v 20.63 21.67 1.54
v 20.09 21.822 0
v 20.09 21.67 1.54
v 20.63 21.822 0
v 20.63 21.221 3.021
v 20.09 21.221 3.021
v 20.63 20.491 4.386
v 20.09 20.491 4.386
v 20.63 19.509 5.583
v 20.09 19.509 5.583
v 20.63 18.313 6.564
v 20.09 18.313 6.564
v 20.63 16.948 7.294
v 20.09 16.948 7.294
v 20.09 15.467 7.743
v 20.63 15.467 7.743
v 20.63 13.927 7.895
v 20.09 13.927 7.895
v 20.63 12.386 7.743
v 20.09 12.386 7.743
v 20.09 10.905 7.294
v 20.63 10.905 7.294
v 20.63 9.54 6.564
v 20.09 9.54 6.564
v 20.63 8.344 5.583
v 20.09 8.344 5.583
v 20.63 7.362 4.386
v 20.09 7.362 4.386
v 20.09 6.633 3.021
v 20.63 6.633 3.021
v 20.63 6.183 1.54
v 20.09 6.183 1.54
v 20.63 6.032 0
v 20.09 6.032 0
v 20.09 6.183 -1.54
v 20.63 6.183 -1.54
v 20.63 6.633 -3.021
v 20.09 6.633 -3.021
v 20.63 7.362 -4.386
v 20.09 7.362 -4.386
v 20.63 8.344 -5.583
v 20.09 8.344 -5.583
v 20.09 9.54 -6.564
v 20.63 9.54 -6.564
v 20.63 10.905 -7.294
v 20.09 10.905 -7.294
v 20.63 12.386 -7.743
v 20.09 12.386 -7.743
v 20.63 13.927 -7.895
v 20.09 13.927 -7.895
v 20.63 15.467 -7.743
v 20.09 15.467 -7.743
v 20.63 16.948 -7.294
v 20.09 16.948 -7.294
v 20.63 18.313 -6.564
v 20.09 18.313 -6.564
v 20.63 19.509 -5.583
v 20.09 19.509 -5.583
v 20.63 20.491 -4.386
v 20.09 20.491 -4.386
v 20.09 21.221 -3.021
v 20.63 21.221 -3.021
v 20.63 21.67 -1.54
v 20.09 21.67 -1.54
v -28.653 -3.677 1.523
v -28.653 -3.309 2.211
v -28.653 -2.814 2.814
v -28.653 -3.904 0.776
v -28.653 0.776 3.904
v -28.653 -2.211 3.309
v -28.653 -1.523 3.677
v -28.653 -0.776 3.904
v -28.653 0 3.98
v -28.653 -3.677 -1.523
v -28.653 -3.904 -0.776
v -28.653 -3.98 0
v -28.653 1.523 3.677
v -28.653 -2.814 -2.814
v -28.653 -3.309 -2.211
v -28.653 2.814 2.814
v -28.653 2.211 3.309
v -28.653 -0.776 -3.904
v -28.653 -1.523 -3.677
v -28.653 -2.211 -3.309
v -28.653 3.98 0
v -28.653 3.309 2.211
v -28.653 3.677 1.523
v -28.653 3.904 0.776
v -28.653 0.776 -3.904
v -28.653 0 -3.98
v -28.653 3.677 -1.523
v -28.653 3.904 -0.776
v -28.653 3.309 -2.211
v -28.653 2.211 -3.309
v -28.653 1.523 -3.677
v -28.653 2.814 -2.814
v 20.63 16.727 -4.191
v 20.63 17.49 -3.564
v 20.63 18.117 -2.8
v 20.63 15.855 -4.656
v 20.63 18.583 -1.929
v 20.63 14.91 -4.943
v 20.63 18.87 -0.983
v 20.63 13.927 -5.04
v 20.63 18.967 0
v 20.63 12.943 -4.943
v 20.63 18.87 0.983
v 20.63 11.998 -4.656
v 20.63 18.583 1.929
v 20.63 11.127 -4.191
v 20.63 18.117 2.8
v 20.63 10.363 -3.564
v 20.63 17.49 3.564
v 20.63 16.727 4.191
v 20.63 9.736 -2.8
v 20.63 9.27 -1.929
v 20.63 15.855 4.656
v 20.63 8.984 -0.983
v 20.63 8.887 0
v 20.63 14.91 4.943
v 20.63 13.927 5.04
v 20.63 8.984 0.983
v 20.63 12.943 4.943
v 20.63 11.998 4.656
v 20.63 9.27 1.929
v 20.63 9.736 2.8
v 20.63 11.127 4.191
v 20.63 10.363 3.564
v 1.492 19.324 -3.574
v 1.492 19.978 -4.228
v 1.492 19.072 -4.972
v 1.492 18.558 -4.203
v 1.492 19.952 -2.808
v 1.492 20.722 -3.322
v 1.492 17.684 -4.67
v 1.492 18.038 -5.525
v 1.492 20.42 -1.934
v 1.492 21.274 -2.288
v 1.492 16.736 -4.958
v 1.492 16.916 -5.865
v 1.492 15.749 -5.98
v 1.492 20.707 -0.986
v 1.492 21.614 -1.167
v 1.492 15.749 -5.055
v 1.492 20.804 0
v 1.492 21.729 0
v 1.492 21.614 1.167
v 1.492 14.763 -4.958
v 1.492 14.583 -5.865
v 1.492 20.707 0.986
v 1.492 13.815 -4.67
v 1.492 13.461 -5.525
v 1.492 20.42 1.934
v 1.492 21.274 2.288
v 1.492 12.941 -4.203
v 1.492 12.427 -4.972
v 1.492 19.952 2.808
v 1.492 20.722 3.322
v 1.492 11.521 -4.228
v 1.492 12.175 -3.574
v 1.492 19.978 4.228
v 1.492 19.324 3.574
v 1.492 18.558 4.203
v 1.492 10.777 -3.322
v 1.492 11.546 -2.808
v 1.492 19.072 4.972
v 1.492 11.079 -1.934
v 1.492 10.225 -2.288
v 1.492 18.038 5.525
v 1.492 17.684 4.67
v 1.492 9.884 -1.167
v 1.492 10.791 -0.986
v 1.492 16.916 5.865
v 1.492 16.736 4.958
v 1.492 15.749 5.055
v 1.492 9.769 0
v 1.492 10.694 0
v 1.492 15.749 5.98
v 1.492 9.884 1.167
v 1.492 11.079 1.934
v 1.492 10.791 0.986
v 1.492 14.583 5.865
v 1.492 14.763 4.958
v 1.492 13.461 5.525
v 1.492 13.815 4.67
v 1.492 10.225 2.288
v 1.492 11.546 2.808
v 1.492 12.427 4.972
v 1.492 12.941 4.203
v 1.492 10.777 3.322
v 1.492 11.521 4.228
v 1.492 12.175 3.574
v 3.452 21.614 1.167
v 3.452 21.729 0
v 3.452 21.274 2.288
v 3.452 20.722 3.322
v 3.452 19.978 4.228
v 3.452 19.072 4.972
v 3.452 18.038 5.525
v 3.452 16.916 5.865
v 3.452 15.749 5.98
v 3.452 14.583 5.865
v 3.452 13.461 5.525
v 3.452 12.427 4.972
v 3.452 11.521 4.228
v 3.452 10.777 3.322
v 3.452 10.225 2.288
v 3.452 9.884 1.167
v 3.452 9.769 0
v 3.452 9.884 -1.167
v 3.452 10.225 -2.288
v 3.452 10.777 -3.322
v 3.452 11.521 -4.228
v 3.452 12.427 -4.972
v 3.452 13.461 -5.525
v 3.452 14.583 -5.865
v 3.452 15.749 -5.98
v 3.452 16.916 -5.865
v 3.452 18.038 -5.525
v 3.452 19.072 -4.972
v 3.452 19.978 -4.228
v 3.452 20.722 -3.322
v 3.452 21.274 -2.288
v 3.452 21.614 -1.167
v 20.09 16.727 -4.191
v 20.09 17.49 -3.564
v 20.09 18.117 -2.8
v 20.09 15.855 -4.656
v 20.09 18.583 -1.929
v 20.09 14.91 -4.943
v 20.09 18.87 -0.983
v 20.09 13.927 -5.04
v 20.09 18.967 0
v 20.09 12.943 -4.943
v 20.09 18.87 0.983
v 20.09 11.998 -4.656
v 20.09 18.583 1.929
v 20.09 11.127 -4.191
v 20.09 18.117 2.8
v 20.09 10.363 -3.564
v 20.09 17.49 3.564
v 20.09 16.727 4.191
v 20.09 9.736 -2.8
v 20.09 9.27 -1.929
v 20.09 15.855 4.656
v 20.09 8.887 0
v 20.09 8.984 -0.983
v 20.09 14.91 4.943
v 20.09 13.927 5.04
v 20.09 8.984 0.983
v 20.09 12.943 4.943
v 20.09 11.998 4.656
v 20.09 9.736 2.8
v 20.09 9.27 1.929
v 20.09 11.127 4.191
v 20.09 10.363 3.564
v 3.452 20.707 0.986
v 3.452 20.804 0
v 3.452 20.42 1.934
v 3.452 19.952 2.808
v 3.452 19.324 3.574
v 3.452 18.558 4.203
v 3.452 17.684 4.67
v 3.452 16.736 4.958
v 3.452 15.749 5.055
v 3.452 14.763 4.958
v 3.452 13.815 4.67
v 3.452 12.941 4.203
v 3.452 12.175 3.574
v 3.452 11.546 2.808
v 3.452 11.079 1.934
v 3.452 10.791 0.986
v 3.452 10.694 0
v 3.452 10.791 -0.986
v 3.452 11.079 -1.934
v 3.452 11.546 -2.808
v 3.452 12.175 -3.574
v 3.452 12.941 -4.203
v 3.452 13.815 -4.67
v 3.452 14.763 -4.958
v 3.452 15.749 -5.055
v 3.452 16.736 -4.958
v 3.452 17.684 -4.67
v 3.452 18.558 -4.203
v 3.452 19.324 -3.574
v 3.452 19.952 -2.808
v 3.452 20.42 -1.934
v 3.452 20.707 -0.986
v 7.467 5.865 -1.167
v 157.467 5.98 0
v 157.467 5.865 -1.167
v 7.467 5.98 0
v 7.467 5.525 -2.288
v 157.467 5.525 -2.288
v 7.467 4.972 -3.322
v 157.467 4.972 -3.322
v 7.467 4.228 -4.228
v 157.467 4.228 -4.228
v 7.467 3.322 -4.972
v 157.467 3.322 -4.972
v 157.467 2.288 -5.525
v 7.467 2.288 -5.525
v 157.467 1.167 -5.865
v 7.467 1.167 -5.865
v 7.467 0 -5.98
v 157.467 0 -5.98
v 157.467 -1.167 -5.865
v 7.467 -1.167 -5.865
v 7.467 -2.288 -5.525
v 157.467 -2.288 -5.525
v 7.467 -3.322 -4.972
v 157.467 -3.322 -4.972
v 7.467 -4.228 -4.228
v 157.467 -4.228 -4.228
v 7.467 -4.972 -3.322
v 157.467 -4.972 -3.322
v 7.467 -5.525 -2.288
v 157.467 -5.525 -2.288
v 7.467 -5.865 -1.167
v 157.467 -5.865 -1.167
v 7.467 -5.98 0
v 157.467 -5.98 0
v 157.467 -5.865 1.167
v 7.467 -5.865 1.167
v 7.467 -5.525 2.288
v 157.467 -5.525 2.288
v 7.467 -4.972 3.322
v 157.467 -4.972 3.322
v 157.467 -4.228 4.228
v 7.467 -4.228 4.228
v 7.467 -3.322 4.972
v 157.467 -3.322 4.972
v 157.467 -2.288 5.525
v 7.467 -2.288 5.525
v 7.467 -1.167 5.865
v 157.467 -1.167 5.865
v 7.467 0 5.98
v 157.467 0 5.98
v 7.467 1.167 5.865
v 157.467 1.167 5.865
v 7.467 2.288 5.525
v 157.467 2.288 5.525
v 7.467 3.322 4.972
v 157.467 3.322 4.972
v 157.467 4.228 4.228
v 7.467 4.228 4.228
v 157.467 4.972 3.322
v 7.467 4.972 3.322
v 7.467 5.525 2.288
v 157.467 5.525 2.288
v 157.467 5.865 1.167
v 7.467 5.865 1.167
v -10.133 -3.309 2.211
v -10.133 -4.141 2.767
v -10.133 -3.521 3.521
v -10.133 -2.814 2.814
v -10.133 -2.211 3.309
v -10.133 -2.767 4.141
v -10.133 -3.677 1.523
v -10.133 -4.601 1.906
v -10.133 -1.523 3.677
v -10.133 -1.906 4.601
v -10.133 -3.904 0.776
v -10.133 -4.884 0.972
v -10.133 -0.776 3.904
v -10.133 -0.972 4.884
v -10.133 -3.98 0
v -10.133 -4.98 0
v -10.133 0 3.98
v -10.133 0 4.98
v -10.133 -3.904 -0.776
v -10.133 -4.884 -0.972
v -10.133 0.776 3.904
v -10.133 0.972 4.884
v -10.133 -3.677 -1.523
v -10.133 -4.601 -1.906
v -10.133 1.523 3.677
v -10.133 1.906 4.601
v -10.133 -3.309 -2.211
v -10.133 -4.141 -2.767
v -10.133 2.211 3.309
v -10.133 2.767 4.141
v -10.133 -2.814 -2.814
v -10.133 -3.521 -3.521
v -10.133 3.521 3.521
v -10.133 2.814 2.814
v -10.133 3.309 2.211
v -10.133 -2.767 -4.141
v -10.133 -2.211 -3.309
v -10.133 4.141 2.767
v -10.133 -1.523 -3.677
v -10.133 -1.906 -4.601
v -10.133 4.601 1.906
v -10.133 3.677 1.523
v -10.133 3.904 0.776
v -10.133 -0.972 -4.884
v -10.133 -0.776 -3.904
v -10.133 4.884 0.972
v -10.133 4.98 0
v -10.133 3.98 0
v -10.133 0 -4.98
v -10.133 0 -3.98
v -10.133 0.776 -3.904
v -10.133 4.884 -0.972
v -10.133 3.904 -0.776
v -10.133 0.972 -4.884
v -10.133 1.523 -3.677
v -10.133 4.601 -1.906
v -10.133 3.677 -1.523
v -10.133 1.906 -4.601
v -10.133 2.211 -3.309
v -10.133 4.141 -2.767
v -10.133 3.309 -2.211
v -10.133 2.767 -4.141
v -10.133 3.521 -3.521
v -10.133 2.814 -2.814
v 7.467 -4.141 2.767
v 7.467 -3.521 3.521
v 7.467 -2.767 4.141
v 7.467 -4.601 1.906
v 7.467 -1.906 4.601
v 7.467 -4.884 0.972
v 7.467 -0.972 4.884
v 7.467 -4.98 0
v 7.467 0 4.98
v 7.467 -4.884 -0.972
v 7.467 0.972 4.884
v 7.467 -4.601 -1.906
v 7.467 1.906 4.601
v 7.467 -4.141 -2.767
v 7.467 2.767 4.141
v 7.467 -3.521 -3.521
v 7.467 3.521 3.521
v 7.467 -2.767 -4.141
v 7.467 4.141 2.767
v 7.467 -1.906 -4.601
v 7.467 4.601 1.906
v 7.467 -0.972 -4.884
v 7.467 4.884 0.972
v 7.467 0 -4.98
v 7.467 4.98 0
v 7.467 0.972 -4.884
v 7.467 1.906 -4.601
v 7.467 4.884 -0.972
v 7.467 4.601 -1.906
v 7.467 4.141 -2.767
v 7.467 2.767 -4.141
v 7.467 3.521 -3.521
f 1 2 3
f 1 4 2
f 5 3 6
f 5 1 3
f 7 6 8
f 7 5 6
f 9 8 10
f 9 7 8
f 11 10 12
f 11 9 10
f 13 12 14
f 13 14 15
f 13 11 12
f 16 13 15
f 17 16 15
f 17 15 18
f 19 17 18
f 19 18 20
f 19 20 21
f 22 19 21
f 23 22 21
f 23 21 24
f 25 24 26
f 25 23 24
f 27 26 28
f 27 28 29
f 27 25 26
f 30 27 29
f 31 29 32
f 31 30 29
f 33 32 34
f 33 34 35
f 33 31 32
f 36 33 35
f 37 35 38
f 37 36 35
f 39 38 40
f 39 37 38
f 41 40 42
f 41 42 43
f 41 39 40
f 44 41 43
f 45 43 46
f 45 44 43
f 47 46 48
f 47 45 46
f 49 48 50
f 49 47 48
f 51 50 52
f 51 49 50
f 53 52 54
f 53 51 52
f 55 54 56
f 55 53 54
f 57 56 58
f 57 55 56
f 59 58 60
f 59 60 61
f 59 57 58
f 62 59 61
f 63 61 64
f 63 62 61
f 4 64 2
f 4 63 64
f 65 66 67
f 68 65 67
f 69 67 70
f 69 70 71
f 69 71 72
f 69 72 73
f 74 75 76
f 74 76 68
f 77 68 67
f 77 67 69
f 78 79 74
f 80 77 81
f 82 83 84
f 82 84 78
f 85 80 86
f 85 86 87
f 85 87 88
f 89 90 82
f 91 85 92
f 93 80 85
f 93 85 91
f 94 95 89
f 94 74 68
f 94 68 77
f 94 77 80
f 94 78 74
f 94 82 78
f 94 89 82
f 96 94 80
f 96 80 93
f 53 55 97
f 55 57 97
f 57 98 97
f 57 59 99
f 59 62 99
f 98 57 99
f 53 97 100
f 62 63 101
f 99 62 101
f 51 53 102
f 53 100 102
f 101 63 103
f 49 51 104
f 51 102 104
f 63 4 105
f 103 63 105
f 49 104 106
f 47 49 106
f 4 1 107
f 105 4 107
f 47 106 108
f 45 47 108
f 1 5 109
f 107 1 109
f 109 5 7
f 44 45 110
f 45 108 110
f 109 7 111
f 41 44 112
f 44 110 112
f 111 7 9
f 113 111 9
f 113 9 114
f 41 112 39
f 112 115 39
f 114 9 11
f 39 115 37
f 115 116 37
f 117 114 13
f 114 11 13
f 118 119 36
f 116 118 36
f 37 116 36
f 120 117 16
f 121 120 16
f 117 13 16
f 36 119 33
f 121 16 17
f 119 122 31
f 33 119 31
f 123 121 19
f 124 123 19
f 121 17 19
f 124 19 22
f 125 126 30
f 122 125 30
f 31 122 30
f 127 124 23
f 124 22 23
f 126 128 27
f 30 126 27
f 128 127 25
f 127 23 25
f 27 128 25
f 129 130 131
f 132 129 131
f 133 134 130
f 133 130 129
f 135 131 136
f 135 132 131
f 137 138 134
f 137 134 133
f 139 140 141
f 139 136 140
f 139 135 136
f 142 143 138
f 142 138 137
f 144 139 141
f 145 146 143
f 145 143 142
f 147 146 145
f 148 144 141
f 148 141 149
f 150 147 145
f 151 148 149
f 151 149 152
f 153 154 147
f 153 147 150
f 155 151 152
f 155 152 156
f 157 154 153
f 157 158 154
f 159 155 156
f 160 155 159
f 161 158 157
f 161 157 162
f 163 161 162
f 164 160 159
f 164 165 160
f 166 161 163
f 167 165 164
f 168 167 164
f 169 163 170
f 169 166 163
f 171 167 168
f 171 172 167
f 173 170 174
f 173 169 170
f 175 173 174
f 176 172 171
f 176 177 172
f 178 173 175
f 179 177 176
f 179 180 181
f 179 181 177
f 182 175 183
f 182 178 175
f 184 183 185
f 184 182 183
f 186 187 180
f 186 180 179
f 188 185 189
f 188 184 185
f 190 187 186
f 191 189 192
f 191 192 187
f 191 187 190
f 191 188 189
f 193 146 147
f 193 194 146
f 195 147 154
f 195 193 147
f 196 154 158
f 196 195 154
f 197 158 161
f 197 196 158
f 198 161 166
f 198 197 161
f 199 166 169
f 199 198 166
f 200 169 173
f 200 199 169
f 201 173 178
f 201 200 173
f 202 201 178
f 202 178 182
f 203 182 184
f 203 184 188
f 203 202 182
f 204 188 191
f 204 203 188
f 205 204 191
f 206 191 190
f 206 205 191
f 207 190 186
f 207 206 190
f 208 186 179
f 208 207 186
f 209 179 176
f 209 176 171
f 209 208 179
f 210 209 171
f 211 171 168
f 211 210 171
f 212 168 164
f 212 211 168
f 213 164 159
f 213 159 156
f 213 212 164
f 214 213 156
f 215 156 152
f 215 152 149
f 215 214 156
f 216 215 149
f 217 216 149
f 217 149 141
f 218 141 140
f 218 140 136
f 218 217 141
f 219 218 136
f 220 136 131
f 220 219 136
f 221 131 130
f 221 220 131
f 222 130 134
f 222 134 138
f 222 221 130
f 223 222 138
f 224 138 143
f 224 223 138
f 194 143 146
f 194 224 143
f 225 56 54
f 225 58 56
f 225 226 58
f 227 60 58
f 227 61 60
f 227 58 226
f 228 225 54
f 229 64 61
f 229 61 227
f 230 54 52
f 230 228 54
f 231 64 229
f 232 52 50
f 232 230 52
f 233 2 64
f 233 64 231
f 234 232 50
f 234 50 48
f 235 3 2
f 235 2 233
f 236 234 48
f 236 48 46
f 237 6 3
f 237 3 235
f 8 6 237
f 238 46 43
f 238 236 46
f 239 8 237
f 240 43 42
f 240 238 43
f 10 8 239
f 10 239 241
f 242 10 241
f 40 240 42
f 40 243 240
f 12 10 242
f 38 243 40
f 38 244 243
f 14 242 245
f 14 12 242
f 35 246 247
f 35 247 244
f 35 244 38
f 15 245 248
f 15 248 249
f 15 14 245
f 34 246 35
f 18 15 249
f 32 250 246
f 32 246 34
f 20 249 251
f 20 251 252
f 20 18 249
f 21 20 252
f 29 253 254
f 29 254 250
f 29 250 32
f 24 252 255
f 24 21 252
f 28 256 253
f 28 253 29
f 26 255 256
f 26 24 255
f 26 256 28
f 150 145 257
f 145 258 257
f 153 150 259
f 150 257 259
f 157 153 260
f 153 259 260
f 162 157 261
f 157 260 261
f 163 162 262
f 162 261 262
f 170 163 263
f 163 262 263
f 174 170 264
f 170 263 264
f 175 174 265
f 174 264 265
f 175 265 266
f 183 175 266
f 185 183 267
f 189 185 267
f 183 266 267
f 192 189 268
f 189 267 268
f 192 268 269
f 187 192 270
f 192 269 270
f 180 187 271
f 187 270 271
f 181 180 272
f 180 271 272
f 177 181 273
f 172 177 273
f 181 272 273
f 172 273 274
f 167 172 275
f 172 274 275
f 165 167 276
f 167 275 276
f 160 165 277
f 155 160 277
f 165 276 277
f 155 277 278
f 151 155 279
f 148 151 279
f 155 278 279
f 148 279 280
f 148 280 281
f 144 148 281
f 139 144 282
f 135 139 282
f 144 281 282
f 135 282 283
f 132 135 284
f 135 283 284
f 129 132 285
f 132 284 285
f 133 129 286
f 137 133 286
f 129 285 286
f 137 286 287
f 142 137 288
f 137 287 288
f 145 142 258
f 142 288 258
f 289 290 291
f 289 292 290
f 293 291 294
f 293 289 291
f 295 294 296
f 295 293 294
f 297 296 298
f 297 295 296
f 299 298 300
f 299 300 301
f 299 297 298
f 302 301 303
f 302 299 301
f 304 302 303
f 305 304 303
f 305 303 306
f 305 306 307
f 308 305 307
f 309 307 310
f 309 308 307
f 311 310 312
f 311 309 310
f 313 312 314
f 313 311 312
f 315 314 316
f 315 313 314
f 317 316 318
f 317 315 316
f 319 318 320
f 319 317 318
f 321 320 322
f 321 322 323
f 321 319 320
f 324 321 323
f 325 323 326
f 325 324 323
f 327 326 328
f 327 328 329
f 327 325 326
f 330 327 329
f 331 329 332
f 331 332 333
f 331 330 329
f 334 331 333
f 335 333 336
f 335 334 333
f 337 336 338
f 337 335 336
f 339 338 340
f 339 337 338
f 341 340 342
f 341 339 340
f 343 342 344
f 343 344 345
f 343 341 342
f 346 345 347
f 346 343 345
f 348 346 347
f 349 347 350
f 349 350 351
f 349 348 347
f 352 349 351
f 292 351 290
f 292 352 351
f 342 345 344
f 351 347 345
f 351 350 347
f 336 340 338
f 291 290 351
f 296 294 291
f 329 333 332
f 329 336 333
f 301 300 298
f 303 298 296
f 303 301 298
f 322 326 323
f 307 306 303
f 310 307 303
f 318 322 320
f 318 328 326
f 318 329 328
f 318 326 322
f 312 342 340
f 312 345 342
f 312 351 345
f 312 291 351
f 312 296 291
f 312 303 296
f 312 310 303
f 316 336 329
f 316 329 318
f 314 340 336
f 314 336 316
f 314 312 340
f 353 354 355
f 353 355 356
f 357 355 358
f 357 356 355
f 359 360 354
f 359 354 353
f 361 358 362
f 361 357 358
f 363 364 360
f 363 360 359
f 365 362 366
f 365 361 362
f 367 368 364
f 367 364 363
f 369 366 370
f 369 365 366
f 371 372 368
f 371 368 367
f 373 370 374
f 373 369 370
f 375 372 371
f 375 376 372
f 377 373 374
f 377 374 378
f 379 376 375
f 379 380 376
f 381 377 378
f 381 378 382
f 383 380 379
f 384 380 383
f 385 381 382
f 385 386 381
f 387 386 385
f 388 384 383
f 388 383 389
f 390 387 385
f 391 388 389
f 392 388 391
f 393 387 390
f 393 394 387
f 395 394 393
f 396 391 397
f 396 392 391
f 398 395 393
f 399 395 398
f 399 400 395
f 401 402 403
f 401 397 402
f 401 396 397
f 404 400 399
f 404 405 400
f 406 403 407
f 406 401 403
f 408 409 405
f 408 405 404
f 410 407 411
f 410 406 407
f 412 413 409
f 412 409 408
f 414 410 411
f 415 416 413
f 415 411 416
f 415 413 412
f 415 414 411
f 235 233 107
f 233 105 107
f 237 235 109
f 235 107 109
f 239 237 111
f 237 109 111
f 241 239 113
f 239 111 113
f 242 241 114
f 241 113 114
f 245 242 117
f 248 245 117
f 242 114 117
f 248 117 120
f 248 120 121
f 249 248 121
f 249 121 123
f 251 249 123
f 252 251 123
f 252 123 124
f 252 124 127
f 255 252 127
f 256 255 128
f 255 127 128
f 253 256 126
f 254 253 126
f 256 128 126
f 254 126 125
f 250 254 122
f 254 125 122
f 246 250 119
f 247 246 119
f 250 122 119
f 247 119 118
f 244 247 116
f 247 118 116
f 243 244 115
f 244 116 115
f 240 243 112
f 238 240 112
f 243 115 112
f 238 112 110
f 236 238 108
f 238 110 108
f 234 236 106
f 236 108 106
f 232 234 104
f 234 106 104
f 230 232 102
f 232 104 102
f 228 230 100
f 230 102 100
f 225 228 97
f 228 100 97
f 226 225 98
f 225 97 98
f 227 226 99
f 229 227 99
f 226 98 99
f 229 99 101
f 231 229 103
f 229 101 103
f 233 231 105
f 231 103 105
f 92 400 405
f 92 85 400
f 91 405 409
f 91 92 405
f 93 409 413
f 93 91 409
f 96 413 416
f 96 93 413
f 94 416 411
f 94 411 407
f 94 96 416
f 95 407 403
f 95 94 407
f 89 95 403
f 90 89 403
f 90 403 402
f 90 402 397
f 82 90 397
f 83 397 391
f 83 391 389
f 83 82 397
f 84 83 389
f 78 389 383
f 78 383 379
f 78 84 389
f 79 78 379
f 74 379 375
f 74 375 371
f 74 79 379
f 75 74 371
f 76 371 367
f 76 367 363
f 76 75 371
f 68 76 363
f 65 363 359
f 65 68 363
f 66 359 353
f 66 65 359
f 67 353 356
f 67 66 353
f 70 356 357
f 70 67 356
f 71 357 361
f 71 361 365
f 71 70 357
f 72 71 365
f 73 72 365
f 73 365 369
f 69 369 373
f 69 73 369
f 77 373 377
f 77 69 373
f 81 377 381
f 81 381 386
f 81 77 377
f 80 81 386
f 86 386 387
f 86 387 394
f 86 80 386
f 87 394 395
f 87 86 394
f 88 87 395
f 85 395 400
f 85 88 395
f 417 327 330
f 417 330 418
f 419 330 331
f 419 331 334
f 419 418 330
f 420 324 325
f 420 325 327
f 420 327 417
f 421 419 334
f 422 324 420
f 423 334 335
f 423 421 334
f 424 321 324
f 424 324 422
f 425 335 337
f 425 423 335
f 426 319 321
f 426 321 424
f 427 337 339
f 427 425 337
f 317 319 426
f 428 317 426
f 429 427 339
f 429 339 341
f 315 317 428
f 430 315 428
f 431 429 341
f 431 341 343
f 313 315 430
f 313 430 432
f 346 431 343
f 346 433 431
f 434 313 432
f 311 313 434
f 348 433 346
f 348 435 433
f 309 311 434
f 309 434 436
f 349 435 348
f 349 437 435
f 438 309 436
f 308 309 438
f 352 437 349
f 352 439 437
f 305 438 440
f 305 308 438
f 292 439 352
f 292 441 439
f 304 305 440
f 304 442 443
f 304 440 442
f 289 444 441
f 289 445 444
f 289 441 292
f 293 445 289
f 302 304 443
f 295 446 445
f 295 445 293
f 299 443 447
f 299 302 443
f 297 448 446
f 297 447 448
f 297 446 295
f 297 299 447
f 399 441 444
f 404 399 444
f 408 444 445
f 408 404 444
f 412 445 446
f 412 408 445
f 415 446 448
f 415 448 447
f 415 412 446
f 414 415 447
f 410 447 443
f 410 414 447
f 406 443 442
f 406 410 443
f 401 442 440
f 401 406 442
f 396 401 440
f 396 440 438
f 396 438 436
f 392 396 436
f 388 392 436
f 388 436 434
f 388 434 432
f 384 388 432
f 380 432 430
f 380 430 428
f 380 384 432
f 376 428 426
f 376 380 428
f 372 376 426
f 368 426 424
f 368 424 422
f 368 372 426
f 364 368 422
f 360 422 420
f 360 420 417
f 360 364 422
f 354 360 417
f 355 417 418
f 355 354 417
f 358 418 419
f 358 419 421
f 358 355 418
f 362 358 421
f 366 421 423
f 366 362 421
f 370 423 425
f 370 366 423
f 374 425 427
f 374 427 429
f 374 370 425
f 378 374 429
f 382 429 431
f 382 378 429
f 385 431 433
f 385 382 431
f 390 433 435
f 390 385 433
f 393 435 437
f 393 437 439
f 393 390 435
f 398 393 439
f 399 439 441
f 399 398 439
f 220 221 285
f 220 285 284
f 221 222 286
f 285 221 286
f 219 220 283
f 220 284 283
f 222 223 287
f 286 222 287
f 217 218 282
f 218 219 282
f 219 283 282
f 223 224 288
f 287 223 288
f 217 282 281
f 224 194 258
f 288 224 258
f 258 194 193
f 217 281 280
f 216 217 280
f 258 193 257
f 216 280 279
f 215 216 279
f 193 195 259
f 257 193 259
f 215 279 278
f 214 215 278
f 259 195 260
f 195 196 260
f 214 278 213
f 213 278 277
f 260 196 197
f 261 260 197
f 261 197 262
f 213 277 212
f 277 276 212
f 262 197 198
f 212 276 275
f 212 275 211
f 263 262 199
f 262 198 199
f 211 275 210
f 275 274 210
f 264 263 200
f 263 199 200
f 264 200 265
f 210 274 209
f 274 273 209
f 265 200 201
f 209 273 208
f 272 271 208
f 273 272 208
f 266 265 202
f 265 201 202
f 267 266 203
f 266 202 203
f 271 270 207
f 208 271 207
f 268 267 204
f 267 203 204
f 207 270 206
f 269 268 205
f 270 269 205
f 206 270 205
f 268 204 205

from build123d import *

# Parameters (mm, degrees)
F2_W = 1.96
F2_H = 0.925
F4_W = 0.54
F4_H = 2.855


with BuildPart() as f1:
    # F0 (on Top) → F1 (revolve)
    with BuildSketch(Plane.XY):
        Polygon((-28.652601, 3.98), (-28.652601, 0), (157.467399, 0), (157.467399, 5.98), (7.467399, 5.98), (7.467399, 4.98), (-10.132601, 4.98), (-10.132601, 3.98), align=None)
    revolve(axis=Axis((64.407399, 0, 0), (-1, 0, 0)))


with BuildPart() as f3:
    # F2 (on Top) → F3 (revolve)
    with BuildSketch(Plane.XY):
        with Locations((2.471874, 21.266823)):
            Rectangle(F2_W, F2_H)
    revolve(axis=Axis((3.085692, 15.749323, 0), (1, 0, 0)))


with BuildPart() as f5:
    # F4 (on Top) → F5 (revolve)
    with BuildSketch(Plane.XY):
        with Locations((20.359954, 20.394169)):
            Rectangle(F4_W, F4_H)
    revolve(axis=Axis((24.295919, 13.926669, 0), (1, 0, 0)))


solid = Compound([f1.part, f3.part, f5.part])
